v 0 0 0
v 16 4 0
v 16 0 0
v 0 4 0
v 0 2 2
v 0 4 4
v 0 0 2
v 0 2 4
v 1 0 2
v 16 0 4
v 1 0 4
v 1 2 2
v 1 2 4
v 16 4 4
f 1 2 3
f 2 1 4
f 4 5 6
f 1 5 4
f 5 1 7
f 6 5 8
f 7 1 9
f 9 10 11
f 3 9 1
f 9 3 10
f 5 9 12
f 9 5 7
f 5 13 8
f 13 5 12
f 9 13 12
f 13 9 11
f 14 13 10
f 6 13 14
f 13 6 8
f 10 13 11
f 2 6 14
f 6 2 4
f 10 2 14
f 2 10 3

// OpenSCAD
union() {
    translate([0, 0, 0]) cube([1, 1, 1]);
    translate([0, 0, 1]) cube([1, 1, 1]);
    translate([0, 1, 0]) cube([1, 1, 1]);
    translate([0, 1, 1]) cube([1, 1, 1]);
    translate([1, 0, 0]) cube([1, 1, 1]);
    translate([1, 0, 1]) cube([1, 1, 1]);
    translate([1, 1, 0]) cube([1, 1, 1]);
    translate([1, 1, 1]) cube([1, 1, 1]);
    translate([2, 0, 0]) cube([1, 1, 1]);
    translate([2, 0, 1]) cube([1, 1, 1]);
    translate([2, 1, 0]) cube([1, 1, 1]);
    translate([2, 1, 1]) cube([1, 1, 1]);
    translate([0, 2, 0]) cube([1, 1, 1]);
    translate([0, 2, 1]) cube([1, 1, 1]);
    translate([0, 2, 2]) cube([1, 1, 1]);
    translate([0, 2, 3]) cube([1, 1, 1]);
    translate([0, 3, 0]) cube([1, 1, 1]);
    translate([0, 3, 1]) cube([1, 1, 1]);
    translate([0, 3, 2]) cube([1, 1, 1]);
    translate([0, 3, 3]) cube([1, 1, 1]);
    translate([1, 0, 2]) cube([1, 1, 1]);
    translate([1, 0, 3]) cube([1, 1, 1]);
    translate([1, 1, 2]) cube([1, 1, 1]);
    translate([1, 1, 3]) cube([1, 1, 1]);
    translate([1, 2, 0]) cube([1, 1, 1]);
    translate([1, 2, 1]) cube([1, 1, 1]);
    translate([1, 2, 2]) cube([1, 1, 1]);
    translate([1, 2, 3]) cube([1, 1, 1]);
    translate([1, 3, 0]) cube([1, 1, 1]);
    translate([1, 3, 1]) cube([1, 1, 1]);
    translate([1, 3, 2]) cube([1, 1, 1]);
    translate([1, 3, 3]) cube([1, 1, 1]);
    translate([2, 0, 2]) cube([1, 1, 1]);
    translate([2, 0, 3]) cube([1, 1, 1]);
    translate([2, 1, 2]) cube([1, 1, 1]);
    translate([2, 1, 3]) cube([1, 1, 1]);
    translate([2, 2, 0]) cube([1, 1, 1]);
    translate([2, 2, 1]) cube([1, 1, 1]);
    translate([2, 2, 2]) cube([1, 1, 1]);
    translate([2, 2, 3]) cube([1, 1, 1]);
    translate([2, 3, 0]) cube([1, 1, 1]);
    translate([2, 3, 1]) cube([1, 1, 1]);
    translate([2, 3, 2]) cube([1, 1, 1]);
    translate([2, 3, 3]) cube([1, 1, 1]);
    translate([3, 0, 0]) cube([1, 1, 1]);
    translate([3, 0, 1]) cube([1, 1, 1]);
    translate([3, 0, 2]) cube([1, 1, 1]);
    translate([3, 0, 3]) cube([1, 1, 1]);
    translate([3, 1, 0]) cube([1, 1, 1]);
    translate([3, 1, 1]) cube([1, 1, 1]);
    translate([3, 1, 2]) cube([1, 1, 1]);
    translate([3, 1, 3]) cube([1, 1, 1]);
    translate([3, 2, 0]) cube([1, 1, 1]);
    translate([3, 2, 1]) cube([1, 1, 1]);
    translate([3, 2, 2]) cube([1, 1, 1]);
    translate([3, 2, 3]) cube([1, 1, 1]);
    translate([3, 3, 0]) cube([1, 1, 1]);
    translate([3, 3, 1]) cube([1, 1, 1]);
    translate([3, 3, 2]) cube([1, 1, 1]);
    translate([3, 3, 3]) cube([1, 1, 1]);
    translate([4, 0, 0]) cube([1, 1, 1]);
    translate([4, 0, 1]) cube([1, 1, 1]);
    translate([4, 0, 2]) cube([1, 1, 1]);
    translate([4, 0, 3]) cube([1, 1, 1]);
    translate([4, 1, 0]) cube([1, 1, 1]);
    translate([4, 1, 1]) cube([1, 1, 1]);
    translate([4, 1, 2]) cube([1, 1, 1]);
    translate([4, 1, 3]) cube([1, 1, 1]);
    translate([4, 2, 0]) cube([1, 1, 1]);
    translate([4, 2, 1]) cube([1, 1, 1]);
    translate([4, 2, 2]) cube([1, 1, 1]);
    translate([4, 2, 3]) cube([1, 1, 1]);
    translate([4, 3, 0]) cube([1, 1, 1]);
    translate([4, 3, 1]) cube([1, 1, 1]);
    translate([4, 3, 2]) cube([1, 1, 1]);
    translate([4, 3, 3]) cube([1, 1, 1]);
    translate([5, 0, 0]) cube([1, 1, 1]);
    translate([5, 0, 1]) cube([1, 1, 1]);
    translate([5, 0, 2]) cube([1, 1, 1]);
    translate([5, 0, 3]) cube([1, 1, 1]);
    translate([5, 1, 0]) cube([1, 1, 1]);
    translate([5, 1, 1]) cube([1, 1, 1]);
    translate([5, 1, 2]) cube([1, 1, 1]);
    translate([5, 1, 3]) cube([1, 1, 1]);
    translate([5, 2, 0]) cube([1, 1, 1]);
    translate([5, 2, 1]) cube([1, 1, 1]);
    translate([5, 2, 2]) cube([1, 1, 1]);
    translate([5, 2, 3]) cube([1, 1, 1]);
    translate([5, 3, 0]) cube([1, 1, 1]);
    translate([5, 3, 1]) cube([1, 1, 1]);
    translate([5, 3, 2]) cube([1, 1, 1]);
    translate([5, 3, 3]) cube([1, 1, 1]);
    translate([6, 0, 0]) cube([1, 1, 1]);
    translate([6, 0, 1]) cube([1, 1, 1]);
    translate([6, 0, 2]) cube([1, 1, 1]);
    translate([6, 0, 3]) cube([1, 1, 1]);
    translate([6, 1, 0]) cube([1, 1, 1]);
    translate([6, 1, 1]) cube([1, 1, 1]);
    translate([6, 1, 2]) cube([1, 1, 1]);
    translate([6, 1, 3]) cube([1, 1, 1]);
    translate([6, 2, 0]) cube([1, 1, 1]);
    translate([6, 2, 1]) cube([1, 1, 1]);
    translate([6, 2, 2]) cube([1, 1, 1]);
    translate([6, 2, 3]) cube([1, 1, 1]);
    translate([6, 3, 0]) cube([1, 1, 1]);
    translate([6, 3, 1]) cube([1, 1, 1]);
    translate([6, 3, 2]) cube([1, 1, 1]);
    translate([6, 3, 3]) cube([1, 1, 1]);
    translate([7, 0, 0]) cube([1, 1, 1]);
    translate([7, 0, 1]) cube([1, 1, 1]);
    translate([7, 0, 2]) cube([1, 1, 1]);
    translate([7, 0, 3]) cube([1, 1, 1]);
    translate([7, 1, 0]) cube([1, 1, 1]);
    translate([7, 1, 1]) cube([1, 1, 1]);
    translate([7, 1, 2]) cube([1, 1, 1]);
    translate([7, 1, 3]) cube([1, 1, 1]);
    translate([7, 2, 0]) cube([1, 1, 1]);
    translate([7, 2, 1]) cube([1, 1, 1]);
    translate([7, 2, 2]) cube([1, 1, 1]);
    translate([7, 2, 3]) cube([1, 1, 1]);
    translate([7, 3, 0]) cube([1, 1, 1]);
    translate([7, 3, 1]) cube([1, 1, 1]);
    translate([7, 3, 2]) cube([1, 1, 1]);
    translate([7, 3, 3]) cube([1, 1, 1]);
    translate([8, 0, 0]) cube([1, 1, 1]);
    translate([8, 0, 1]) cube([1, 1, 1]);
    translate([8, 0, 2]) cube([1, 1, 1]);
    translate([8, 0, 3]) cube([1, 1, 1]);
    translate([8, 1, 0]) cube([1, 1, 1]);
    translate([8, 1, 1]) cube([1, 1, 1]);
    translate([8, 1, 2]) cube([1, 1, 1]);
    translate([8, 1, 3]) cube([1, 1, 1]);
    translate([8, 2, 0]) cube([1, 1, 1]);
    translate([8, 2, 1]) cube([1, 1, 1]);
    translate([8, 2, 2]) cube([1, 1, 1]);
    translate([8, 2, 3]) cube([1, 1, 1]);
    translate([8, 3, 0]) cube([1, 1, 1]);
    translate([8, 3, 1]) cube([1, 1, 1]);
    translate([8, 3, 2]) cube([1, 1, 1]);
    translate([8, 3, 3]) cube([1, 1, 1]);
    translate([9, 0, 0]) cube([1, 1, 1]);
    translate([9, 0, 1]) cube([1, 1, 1]);
    translate([9, 0, 2]) cube([1, 1, 1]);
    translate([9, 0, 3]) cube([1, 1, 1]);
    translate([9, 1, 0]) cube([1, 1, 1]);
    translate([9, 1, 1]) cube([1, 1, 1]);
    translate([9, 1, 2]) cube([1, 1, 1]);
    translate([9, 1, 3]) cube([1, 1, 1]);
    translate([9, 2, 0]) cube([1, 1, 1]);
    translate([9, 2, 1]) cube([1, 1, 1]);
    translate([9, 2, 2]) cube([1, 1, 1]);
    translate([9, 2, 3]) cube([1, 1, 1]);
    translate([9, 3, 0]) cube([1, 1, 1]);
    translate([9, 3, 1]) cube([1, 1, 1]);
    translate([9, 3, 2]) cube([1, 1, 1]);
    translate([9, 3, 3]) cube([1, 1, 1]);
    translate([10, 0, 0]) cube([1, 1, 1]);
    translate([10, 0, 1]) cube([1, 1, 1]);
    translate([10, 0, 2]) cube([1, 1, 1]);
    translate([10, 0, 3]) cube([1, 1, 1]);
    translate([10, 1, 0]) cube([1, 1, 1]);
    translate([10, 1, 1]) cube([1, 1, 1]);
    translate([10, 1, 2]) cube([1, 1, 1]);
    translate([10, 1, 3]) cube([1, 1, 1]);
    translate([10, 2, 0]) cube([1, 1, 1]);
    translate([10, 2, 1]) cube([1, 1, 1]);
    translate([10, 2, 2]) cube([1, 1, 1]);
    translate([10, 2, 3]) cube([1, 1, 1]);
    translate([10, 3, 0]) cube([1, 1, 1]);
    translate([10, 3, 1]) cube([1, 1, 1]);
    translate([10, 3, 2]) cube([1, 1, 1]);
    translate([10, 3, 3]) cube([1, 1, 1]);
    translate([11, 0, 0]) cube([1, 1, 1]);
    translate([11, 0, 1]) cube([1, 1, 1]);
    translate([11, 0, 2]) cube([1, 1, 1]);
    translate([11, 0, 3]) cube([1, 1, 1]);
    translate([11, 1, 0]) cube([1, 1, 1]);
    translate([11, 1, 1]) cube([1, 1, 1]);
    translate([11, 1, 2]) cube([1, 1, 1]);
    translate([11, 1, 3]) cube([1, 1, 1]);
    translate([11, 2, 0]) cube([1, 1, 1]);
    translate([11, 2, 1]) cube([1, 1, 1]);
    translate([11, 2, 2]) cube([1, 1, 1]);
    translate([11, 2, 3]) cube([1, 1, 1]);
    translate([11, 3, 0]) cube([1, 1, 1]);
    translate([11, 3, 1]) cube([1, 1, 1]);
    translate([11, 3, 2]) cube([1, 1, 1]);
    translate([11, 3, 3]) cube([1, 1, 1]);
    translate([12, 0, 0]) cube([1, 1, 1]);
    translate([12, 0, 1]) cube([1, 1, 1]);
    translate([12, 0, 2]) cube([1, 1, 1]);
    translate([12, 0, 3]) cube([1, 1, 1]);
    translate([12, 1, 0]) cube([1, 1, 1]);
    translate([12, 1, 1]) cube([1, 1, 1]);
    translate([12, 1, 2]) cube([1, 1, 1]);
    translate([12, 1, 3]) cube([1, 1, 1]);
    translate([12, 2, 0]) cube([1, 1, 1]);
    translate([12, 2, 1]) cube([1, 1, 1]);
    translate([12, 2, 2]) cube([1, 1, 1]);
    translate([12, 2, 3]) cube([1, 1, 1]);
    translate([12, 3, 0]) cube([1, 1, 1]);
    translate([12, 3, 1]) cube([1, 1, 1]);
    translate([12, 3, 2]) cube([1, 1, 1]);
    translate([12, 3, 3]) cube([1, 1, 1]);
    translate([13, 0, 0]) cube([1, 1, 1]);
    translate([13, 0, 1]) cube([1, 1, 1]);
    translate([13, 0, 2]) cube([1, 1, 1]);
    translate([13, 0, 3]) cube([1, 1, 1]);
    translate([13, 1, 0]) cube([1, 1, 1]);
    translate([13, 1, 1]) cube([1, 1, 1]);
    translate([13, 1, 2]) cube([1, 1, 1]);
    translate([13, 1, 3]) cube([1, 1, 1]);
    translate([13, 2, 0]) cube([1, 1, 1]);
    translate([13, 2, 1]) cube([1, 1, 1]);
    translate([13, 2, 2]) cube([1, 1, 1]);
    translate([13, 2, 3]) cube([1, 1, 1]);
    translate([13, 3, 0]) cube([1, 1, 1]);
    translate([13, 3, 1]) cube([1, 1, 1]);
    translate([13, 3, 2]) cube([1, 1, 1]);
    translate([13, 3, 3]) cube([1, 1, 1]);
    translate([14, 0, 0]) cube([1, 1, 1]);
    translate([14, 0, 1]) cube([1, 1, 1]);
    translate([14, 0, 2]) cube([1, 1, 1]);
    translate([14, 0, 3]) cube([1, 1, 1]);
    translate([14, 1, 0]) cube([1, 1, 1]);
    translate([14, 1, 1]) cube([1, 1, 1]);
    translate([14, 1, 2]) cube([1, 1, 1]);
    translate([14, 1, 3]) cube([1, 1, 1]);
    translate([14, 2, 0]) cube([1, 1, 1]);
    translate([14, 2, 1]) cube([1, 1, 1]);
    translate([14, 2, 2]) cube([1, 1, 1]);
    translate([14, 2, 3]) cube([1, 1, 1]);
    translate([14, 3, 0]) cube([1, 1, 1]);
    translate([14, 3, 1]) cube([1, 1, 1]);
    translate([14, 3, 2]) cube([1, 1, 1]);
    translate([14, 3, 3]) cube([1, 1, 1]);
    translate([15, 0, 0]) cube([1, 1, 1]);
    translate([15, 0, 1]) cube([1, 1, 1]);
    translate([15, 0, 2]) cube([1, 1, 1]);
    translate([15, 0, 3]) cube([1, 1, 1]);
    translate([15, 1, 0]) cube([1, 1, 1]);
    translate([15, 1, 1]) cube([1, 1, 1]);
    translate([15, 1, 2]) cube([1, 1, 1]);
    translate([15, 1, 3]) cube([1, 1, 1]);
    translate([15, 2, 0]) cube([1, 1, 1]);
    translate([15, 2, 1]) cube([1, 1, 1]);
    translate([15, 2, 2]) cube([1, 1, 1]);
    translate([15, 2, 3]) cube([1, 1, 1]);
    translate([15, 3, 0]) cube([1, 1, 1]);
    translate([15, 3, 1]) cube([1, 1, 1]);
    translate([15, 3, 2]) cube([1, 1, 1]);
    translate([15, 3, 3]) cube([1, 1, 1]);
}
